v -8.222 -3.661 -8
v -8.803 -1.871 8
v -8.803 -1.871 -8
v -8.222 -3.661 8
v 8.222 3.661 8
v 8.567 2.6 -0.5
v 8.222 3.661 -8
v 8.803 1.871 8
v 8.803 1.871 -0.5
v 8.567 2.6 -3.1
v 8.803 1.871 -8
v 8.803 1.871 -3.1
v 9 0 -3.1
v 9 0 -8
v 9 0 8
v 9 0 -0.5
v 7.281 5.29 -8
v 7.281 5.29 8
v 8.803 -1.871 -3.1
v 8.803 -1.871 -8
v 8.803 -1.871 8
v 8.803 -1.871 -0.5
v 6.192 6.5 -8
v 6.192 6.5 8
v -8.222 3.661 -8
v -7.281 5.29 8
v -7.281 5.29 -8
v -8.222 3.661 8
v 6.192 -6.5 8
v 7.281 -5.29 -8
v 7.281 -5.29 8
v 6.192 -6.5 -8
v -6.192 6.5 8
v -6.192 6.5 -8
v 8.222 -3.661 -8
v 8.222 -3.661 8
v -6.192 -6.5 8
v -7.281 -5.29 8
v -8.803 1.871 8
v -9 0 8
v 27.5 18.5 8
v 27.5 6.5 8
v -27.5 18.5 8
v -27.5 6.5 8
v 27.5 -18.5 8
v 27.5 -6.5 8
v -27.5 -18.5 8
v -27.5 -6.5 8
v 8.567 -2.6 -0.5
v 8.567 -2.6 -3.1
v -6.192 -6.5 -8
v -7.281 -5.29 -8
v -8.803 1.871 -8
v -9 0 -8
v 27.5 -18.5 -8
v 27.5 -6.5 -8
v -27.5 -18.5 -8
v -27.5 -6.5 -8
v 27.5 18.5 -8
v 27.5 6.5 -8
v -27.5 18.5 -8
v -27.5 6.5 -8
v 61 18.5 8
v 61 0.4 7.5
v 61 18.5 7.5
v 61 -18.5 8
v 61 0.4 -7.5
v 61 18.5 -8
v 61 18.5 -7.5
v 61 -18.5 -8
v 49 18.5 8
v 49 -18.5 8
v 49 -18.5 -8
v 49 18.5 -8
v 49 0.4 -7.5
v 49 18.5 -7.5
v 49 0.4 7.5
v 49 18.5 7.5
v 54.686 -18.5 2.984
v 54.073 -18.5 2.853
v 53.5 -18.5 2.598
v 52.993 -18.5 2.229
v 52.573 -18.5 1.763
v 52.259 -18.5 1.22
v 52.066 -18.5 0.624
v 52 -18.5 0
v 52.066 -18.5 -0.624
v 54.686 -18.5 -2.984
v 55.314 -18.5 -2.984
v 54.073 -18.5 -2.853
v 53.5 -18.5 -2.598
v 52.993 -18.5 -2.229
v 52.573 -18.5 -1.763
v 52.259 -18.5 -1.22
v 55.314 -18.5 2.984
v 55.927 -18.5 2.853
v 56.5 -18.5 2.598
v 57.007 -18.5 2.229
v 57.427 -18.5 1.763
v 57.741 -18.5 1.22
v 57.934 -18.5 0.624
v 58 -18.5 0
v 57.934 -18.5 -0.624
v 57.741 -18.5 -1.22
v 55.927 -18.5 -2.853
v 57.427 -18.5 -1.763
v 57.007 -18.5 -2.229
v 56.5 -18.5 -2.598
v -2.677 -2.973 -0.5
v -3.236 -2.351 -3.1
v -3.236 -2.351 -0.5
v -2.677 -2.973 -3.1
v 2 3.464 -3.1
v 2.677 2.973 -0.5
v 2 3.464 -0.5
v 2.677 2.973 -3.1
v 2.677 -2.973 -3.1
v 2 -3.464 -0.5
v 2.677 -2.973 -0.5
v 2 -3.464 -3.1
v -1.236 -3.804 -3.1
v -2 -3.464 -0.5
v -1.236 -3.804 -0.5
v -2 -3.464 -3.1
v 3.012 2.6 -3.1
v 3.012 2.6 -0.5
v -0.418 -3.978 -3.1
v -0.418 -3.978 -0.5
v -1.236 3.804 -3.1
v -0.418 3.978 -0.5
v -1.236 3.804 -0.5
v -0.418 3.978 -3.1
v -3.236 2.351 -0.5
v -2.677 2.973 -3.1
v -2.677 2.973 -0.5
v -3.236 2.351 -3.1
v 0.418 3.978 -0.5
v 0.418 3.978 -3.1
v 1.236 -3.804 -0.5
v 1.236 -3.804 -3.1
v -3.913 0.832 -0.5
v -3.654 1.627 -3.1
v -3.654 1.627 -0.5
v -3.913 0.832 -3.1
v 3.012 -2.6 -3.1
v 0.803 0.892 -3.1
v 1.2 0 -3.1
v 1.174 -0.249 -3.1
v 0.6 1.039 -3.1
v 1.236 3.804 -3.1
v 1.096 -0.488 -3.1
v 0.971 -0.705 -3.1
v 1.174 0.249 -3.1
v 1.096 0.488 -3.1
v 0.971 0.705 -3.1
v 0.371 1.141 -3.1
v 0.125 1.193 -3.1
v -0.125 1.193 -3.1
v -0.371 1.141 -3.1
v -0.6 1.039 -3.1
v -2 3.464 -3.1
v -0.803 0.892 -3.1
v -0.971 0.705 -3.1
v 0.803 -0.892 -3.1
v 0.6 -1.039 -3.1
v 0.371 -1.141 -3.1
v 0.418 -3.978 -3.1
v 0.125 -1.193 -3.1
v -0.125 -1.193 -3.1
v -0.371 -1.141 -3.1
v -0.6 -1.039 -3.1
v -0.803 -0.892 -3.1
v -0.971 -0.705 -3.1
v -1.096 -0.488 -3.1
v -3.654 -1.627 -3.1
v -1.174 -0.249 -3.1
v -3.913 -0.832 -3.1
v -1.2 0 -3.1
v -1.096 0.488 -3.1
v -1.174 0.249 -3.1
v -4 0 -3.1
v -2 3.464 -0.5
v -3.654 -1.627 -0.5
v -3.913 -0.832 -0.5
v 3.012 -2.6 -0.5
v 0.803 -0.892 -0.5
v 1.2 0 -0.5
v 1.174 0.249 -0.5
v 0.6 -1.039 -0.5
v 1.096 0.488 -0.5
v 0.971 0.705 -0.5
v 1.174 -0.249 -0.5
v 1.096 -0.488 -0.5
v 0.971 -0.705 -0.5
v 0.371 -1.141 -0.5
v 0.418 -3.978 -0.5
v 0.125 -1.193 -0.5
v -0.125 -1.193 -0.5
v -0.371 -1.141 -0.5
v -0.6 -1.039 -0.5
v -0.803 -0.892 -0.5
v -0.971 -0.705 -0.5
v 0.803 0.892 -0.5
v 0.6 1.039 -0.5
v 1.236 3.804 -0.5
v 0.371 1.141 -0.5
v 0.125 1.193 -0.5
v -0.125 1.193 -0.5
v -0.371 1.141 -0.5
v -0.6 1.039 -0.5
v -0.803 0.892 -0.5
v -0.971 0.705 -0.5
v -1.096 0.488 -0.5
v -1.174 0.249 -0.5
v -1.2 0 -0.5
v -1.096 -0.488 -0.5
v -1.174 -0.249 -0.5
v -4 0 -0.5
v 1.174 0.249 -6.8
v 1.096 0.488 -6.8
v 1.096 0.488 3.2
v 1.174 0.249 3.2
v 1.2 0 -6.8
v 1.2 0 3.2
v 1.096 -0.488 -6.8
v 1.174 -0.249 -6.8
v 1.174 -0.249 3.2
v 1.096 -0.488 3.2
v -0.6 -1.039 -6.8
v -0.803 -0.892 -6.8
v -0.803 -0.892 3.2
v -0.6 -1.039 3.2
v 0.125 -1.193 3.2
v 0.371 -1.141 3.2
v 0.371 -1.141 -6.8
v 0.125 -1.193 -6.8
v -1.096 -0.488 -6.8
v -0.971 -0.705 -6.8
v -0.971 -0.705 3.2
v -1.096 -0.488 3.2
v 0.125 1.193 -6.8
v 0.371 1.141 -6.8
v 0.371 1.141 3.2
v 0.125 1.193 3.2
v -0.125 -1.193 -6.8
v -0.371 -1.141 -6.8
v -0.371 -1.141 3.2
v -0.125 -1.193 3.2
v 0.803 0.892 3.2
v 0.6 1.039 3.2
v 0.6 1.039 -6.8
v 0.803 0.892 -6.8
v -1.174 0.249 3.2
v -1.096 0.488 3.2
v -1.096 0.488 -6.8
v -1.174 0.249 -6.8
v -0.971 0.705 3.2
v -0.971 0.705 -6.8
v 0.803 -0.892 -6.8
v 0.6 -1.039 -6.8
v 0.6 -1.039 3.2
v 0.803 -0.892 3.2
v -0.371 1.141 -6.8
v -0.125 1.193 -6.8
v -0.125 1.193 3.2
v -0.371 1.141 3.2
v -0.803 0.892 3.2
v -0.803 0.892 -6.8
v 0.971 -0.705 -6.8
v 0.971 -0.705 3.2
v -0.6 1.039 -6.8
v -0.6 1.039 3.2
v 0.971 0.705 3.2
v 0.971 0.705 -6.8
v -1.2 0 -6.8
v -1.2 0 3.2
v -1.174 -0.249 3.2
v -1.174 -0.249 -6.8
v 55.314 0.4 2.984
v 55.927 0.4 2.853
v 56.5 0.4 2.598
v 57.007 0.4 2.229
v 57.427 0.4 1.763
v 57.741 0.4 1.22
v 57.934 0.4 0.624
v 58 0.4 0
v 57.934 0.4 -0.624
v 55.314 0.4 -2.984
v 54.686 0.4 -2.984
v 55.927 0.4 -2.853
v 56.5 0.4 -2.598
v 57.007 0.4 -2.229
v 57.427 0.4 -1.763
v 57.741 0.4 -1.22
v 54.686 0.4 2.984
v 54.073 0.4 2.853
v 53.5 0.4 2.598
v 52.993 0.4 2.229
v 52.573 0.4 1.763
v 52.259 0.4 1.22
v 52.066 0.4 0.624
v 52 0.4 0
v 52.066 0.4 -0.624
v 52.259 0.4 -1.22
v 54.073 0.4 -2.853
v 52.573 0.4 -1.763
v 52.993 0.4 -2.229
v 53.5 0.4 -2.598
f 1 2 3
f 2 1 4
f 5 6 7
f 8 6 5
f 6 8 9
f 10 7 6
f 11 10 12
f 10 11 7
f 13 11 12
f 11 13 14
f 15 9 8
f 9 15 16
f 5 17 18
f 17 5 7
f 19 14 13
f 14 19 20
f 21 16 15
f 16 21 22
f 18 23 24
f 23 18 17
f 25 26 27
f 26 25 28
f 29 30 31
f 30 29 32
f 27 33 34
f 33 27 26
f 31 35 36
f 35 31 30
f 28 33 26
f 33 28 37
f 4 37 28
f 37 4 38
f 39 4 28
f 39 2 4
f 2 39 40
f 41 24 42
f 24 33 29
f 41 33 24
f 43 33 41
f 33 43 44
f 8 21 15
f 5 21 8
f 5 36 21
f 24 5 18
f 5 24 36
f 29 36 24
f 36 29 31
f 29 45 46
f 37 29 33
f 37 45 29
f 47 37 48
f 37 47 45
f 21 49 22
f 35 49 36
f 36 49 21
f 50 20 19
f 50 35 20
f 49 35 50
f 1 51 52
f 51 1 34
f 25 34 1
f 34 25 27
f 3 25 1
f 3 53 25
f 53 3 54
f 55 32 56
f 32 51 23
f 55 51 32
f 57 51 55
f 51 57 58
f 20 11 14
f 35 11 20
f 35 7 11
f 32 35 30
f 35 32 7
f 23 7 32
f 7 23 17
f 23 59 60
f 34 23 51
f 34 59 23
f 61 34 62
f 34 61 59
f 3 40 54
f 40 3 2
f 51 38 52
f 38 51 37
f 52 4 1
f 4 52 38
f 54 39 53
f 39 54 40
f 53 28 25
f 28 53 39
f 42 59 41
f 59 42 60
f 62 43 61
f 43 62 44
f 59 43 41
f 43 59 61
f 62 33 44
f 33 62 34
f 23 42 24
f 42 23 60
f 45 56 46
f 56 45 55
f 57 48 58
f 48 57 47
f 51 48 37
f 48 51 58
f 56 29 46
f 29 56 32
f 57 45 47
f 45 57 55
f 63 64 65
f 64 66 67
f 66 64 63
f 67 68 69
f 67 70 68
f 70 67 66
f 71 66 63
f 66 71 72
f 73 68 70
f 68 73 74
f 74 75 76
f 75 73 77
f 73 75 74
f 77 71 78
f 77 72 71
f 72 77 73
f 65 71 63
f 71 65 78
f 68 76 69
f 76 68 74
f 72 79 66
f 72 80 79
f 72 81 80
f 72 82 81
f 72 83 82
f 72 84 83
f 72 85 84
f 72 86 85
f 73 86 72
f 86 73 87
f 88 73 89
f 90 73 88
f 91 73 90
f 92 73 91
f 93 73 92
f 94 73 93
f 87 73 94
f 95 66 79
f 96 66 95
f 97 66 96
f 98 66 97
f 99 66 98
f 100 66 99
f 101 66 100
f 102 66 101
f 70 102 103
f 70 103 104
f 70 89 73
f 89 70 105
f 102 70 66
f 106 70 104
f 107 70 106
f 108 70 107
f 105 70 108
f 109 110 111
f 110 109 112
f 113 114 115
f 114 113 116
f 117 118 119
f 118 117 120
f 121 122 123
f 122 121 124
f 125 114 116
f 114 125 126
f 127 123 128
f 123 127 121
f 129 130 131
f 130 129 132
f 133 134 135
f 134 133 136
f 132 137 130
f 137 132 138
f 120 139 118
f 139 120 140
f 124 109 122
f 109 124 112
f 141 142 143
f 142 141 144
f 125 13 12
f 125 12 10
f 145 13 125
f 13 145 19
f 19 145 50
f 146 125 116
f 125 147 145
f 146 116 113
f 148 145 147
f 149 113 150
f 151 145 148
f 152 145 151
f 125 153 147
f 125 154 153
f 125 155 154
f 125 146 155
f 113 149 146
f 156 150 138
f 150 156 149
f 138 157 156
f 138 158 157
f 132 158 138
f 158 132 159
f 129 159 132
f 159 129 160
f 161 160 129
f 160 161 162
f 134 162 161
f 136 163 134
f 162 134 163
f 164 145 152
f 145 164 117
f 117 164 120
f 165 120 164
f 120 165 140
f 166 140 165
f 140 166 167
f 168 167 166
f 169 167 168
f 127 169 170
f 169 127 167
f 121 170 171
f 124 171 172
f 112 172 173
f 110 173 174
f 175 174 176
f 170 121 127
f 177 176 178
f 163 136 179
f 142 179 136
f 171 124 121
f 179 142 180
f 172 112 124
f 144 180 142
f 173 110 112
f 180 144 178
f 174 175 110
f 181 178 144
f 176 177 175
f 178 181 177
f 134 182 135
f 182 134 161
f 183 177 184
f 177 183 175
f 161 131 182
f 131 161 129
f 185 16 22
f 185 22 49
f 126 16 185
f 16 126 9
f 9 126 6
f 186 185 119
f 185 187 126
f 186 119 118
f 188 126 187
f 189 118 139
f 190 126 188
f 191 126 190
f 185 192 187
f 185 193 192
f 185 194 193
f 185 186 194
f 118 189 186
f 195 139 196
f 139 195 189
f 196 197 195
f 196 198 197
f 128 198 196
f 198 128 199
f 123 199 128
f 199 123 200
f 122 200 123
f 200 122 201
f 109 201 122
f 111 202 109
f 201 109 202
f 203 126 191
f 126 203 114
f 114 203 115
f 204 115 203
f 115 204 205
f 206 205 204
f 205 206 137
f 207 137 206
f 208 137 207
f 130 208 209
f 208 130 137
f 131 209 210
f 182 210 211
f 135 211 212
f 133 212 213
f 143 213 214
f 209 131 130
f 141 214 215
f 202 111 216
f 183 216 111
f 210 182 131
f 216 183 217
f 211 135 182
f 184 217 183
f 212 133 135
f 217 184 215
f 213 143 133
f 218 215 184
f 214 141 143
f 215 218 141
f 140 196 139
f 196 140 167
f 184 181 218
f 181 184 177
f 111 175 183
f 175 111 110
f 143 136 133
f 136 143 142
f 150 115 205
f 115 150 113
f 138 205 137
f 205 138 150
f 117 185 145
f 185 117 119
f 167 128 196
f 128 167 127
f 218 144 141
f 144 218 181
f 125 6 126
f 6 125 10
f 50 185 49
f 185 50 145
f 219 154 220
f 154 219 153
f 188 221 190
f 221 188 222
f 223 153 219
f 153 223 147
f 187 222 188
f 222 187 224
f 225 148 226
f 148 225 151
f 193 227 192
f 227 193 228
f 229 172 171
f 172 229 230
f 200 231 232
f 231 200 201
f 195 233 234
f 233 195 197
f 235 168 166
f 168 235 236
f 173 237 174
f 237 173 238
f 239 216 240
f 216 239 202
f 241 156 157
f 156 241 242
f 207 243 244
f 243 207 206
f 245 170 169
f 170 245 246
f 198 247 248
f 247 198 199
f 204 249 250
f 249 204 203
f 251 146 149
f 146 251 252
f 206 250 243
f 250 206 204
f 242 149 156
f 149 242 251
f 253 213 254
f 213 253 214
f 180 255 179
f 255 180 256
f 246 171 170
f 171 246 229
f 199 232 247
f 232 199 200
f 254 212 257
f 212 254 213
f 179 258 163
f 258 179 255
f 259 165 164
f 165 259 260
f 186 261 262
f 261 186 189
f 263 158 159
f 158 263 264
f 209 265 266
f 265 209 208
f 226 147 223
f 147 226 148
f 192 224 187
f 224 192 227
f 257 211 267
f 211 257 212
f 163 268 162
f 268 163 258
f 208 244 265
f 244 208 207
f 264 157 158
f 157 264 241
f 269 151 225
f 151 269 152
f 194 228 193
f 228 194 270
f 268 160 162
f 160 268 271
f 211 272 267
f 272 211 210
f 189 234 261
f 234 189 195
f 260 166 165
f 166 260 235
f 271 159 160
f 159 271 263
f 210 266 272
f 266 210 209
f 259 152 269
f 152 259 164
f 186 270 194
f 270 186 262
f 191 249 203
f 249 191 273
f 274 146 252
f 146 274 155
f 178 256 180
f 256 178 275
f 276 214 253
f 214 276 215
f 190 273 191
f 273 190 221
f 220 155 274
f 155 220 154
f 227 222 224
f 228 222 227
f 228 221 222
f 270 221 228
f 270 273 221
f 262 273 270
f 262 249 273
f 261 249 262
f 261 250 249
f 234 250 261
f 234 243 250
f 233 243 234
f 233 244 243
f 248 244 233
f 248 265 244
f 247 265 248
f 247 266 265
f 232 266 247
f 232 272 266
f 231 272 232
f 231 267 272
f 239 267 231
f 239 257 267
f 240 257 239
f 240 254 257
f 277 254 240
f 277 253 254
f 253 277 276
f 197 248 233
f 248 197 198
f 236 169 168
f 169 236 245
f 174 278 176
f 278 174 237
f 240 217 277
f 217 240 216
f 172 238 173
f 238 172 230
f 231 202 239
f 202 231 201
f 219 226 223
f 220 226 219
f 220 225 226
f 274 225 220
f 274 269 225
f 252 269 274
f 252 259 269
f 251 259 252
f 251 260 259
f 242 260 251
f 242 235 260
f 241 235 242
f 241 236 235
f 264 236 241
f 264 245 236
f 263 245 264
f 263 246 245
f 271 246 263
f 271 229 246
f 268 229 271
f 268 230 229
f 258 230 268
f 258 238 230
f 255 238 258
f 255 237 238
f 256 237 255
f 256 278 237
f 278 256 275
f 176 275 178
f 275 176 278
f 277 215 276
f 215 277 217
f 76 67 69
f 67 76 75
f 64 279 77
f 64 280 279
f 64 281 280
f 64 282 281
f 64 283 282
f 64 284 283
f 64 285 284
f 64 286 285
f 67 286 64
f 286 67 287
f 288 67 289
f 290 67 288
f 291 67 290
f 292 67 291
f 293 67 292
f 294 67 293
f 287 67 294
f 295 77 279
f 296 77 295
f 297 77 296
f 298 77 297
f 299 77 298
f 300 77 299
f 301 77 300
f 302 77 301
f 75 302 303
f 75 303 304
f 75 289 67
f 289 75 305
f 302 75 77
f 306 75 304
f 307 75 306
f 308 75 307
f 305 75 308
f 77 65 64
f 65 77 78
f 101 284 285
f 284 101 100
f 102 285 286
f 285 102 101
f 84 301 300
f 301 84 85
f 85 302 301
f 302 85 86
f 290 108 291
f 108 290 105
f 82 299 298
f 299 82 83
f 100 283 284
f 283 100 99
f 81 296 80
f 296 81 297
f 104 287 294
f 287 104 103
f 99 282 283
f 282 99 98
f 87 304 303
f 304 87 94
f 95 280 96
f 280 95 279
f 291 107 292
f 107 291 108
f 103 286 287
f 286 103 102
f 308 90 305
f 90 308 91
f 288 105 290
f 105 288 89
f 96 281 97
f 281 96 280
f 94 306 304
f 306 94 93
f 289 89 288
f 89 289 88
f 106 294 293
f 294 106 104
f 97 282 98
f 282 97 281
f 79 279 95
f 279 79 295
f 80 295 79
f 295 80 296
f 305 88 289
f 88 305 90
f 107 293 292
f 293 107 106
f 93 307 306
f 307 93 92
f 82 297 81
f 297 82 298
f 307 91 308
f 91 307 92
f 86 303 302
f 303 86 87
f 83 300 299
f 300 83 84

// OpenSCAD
// Eslabón de Pata Híbrido (Horquilla/Fork U-Shape estilo SP-8)
// Adaptado para configuración Pitch-Pitch con servo de rodilla horizontal.
// Dos brazos paralelos: uno abraza el servo, el otro es el punto de pivote secundario.

$fn = 30;

link_len = 55.0;
fork_arm_w = 12.0;
fork_gap = 25.0;
fork_h = 16.0;

module eslabon_hibrido() {
    difference() {
        union() {
            // Brida de acople a cadera (disco circular conector)
            cylinder(r = 9, h = fork_h, center=true);

            // Brazo superior (cuerpo del servo)
            translate([0, fork_gap/2, 0])
                cube([link_len, fork_arm_w, fork_h], center=true);

            // Brazo inferior (pivote secundario)
            translate([0, -fork_gap/2, 0])
                cube([link_len, fork_arm_w, fork_h], center=true);

            // Unión frontal (punta de la U) en X = link_len
            translate([link_len, 0, 0])
                cube([fork_arm_w, fork_gap + fork_arm_w, fork_h], center=true);
        }

        // 1. Acople para el horn del servo Cadera en (X=0, Z=-1.8)
        translate([0, 0, -1.8]) {
            cylinder(r=4.0, h=2.6, center=true);
            translate([8.0, 0, 0])
                cube([16.0, 5.2, 2.6], center=true);
            cylinder(r=1.2, h=10, center=true);
        }

        // 2. Bolsillo dual-depth para el servo de Rodilla en el brazo superior
        // El servo se monta horizontal con el eje en X = link_len
        translate([link_len - 5.5, fork_gap/2, 0]) {
            // Zona inferior para cables (30mm largo)
            translate([0, 0, -5.0])
                cube([30.0, 24.2, 5.0], center=true);
            // Zona superior para fijación con tornillos (25mm largo)
            translate([0, 0, 2.5])
                cube([25.0, 24.2, 10.0], center=true);
            // Ranura orejas/bridas
            translate([0, 5.5, 0])
                cube([34.5, 3.2, 13.5], center=true);
            // Agujeros M2
            translate([-14.25, 0, 0])
                rotate([90, 0, 0])
                    cylinder(r=1.0, h=30, center=true);
            translate([14.25, 0, 0])
                rotate([90, 0, 0])
                    cylinder(r=1.0, h=30, center=true);
        }

        // 3. Orificio pasante coaxial en X=link_len para el back shaft/pin
        translate([link_len, -fork_gap/2, 0])
            rotate([90, 0, 0])
                cylinder(r=3.0, h=30, center=true);

        // 4. Abertura delantera para engranaje del servo de rodilla
        translate([link_len, fork_gap/2, 0])
            rotate([90, 0, 0])
                cylinder(r=6.0, h=15, center=true);
    }
}

eslabon_hibrido();
